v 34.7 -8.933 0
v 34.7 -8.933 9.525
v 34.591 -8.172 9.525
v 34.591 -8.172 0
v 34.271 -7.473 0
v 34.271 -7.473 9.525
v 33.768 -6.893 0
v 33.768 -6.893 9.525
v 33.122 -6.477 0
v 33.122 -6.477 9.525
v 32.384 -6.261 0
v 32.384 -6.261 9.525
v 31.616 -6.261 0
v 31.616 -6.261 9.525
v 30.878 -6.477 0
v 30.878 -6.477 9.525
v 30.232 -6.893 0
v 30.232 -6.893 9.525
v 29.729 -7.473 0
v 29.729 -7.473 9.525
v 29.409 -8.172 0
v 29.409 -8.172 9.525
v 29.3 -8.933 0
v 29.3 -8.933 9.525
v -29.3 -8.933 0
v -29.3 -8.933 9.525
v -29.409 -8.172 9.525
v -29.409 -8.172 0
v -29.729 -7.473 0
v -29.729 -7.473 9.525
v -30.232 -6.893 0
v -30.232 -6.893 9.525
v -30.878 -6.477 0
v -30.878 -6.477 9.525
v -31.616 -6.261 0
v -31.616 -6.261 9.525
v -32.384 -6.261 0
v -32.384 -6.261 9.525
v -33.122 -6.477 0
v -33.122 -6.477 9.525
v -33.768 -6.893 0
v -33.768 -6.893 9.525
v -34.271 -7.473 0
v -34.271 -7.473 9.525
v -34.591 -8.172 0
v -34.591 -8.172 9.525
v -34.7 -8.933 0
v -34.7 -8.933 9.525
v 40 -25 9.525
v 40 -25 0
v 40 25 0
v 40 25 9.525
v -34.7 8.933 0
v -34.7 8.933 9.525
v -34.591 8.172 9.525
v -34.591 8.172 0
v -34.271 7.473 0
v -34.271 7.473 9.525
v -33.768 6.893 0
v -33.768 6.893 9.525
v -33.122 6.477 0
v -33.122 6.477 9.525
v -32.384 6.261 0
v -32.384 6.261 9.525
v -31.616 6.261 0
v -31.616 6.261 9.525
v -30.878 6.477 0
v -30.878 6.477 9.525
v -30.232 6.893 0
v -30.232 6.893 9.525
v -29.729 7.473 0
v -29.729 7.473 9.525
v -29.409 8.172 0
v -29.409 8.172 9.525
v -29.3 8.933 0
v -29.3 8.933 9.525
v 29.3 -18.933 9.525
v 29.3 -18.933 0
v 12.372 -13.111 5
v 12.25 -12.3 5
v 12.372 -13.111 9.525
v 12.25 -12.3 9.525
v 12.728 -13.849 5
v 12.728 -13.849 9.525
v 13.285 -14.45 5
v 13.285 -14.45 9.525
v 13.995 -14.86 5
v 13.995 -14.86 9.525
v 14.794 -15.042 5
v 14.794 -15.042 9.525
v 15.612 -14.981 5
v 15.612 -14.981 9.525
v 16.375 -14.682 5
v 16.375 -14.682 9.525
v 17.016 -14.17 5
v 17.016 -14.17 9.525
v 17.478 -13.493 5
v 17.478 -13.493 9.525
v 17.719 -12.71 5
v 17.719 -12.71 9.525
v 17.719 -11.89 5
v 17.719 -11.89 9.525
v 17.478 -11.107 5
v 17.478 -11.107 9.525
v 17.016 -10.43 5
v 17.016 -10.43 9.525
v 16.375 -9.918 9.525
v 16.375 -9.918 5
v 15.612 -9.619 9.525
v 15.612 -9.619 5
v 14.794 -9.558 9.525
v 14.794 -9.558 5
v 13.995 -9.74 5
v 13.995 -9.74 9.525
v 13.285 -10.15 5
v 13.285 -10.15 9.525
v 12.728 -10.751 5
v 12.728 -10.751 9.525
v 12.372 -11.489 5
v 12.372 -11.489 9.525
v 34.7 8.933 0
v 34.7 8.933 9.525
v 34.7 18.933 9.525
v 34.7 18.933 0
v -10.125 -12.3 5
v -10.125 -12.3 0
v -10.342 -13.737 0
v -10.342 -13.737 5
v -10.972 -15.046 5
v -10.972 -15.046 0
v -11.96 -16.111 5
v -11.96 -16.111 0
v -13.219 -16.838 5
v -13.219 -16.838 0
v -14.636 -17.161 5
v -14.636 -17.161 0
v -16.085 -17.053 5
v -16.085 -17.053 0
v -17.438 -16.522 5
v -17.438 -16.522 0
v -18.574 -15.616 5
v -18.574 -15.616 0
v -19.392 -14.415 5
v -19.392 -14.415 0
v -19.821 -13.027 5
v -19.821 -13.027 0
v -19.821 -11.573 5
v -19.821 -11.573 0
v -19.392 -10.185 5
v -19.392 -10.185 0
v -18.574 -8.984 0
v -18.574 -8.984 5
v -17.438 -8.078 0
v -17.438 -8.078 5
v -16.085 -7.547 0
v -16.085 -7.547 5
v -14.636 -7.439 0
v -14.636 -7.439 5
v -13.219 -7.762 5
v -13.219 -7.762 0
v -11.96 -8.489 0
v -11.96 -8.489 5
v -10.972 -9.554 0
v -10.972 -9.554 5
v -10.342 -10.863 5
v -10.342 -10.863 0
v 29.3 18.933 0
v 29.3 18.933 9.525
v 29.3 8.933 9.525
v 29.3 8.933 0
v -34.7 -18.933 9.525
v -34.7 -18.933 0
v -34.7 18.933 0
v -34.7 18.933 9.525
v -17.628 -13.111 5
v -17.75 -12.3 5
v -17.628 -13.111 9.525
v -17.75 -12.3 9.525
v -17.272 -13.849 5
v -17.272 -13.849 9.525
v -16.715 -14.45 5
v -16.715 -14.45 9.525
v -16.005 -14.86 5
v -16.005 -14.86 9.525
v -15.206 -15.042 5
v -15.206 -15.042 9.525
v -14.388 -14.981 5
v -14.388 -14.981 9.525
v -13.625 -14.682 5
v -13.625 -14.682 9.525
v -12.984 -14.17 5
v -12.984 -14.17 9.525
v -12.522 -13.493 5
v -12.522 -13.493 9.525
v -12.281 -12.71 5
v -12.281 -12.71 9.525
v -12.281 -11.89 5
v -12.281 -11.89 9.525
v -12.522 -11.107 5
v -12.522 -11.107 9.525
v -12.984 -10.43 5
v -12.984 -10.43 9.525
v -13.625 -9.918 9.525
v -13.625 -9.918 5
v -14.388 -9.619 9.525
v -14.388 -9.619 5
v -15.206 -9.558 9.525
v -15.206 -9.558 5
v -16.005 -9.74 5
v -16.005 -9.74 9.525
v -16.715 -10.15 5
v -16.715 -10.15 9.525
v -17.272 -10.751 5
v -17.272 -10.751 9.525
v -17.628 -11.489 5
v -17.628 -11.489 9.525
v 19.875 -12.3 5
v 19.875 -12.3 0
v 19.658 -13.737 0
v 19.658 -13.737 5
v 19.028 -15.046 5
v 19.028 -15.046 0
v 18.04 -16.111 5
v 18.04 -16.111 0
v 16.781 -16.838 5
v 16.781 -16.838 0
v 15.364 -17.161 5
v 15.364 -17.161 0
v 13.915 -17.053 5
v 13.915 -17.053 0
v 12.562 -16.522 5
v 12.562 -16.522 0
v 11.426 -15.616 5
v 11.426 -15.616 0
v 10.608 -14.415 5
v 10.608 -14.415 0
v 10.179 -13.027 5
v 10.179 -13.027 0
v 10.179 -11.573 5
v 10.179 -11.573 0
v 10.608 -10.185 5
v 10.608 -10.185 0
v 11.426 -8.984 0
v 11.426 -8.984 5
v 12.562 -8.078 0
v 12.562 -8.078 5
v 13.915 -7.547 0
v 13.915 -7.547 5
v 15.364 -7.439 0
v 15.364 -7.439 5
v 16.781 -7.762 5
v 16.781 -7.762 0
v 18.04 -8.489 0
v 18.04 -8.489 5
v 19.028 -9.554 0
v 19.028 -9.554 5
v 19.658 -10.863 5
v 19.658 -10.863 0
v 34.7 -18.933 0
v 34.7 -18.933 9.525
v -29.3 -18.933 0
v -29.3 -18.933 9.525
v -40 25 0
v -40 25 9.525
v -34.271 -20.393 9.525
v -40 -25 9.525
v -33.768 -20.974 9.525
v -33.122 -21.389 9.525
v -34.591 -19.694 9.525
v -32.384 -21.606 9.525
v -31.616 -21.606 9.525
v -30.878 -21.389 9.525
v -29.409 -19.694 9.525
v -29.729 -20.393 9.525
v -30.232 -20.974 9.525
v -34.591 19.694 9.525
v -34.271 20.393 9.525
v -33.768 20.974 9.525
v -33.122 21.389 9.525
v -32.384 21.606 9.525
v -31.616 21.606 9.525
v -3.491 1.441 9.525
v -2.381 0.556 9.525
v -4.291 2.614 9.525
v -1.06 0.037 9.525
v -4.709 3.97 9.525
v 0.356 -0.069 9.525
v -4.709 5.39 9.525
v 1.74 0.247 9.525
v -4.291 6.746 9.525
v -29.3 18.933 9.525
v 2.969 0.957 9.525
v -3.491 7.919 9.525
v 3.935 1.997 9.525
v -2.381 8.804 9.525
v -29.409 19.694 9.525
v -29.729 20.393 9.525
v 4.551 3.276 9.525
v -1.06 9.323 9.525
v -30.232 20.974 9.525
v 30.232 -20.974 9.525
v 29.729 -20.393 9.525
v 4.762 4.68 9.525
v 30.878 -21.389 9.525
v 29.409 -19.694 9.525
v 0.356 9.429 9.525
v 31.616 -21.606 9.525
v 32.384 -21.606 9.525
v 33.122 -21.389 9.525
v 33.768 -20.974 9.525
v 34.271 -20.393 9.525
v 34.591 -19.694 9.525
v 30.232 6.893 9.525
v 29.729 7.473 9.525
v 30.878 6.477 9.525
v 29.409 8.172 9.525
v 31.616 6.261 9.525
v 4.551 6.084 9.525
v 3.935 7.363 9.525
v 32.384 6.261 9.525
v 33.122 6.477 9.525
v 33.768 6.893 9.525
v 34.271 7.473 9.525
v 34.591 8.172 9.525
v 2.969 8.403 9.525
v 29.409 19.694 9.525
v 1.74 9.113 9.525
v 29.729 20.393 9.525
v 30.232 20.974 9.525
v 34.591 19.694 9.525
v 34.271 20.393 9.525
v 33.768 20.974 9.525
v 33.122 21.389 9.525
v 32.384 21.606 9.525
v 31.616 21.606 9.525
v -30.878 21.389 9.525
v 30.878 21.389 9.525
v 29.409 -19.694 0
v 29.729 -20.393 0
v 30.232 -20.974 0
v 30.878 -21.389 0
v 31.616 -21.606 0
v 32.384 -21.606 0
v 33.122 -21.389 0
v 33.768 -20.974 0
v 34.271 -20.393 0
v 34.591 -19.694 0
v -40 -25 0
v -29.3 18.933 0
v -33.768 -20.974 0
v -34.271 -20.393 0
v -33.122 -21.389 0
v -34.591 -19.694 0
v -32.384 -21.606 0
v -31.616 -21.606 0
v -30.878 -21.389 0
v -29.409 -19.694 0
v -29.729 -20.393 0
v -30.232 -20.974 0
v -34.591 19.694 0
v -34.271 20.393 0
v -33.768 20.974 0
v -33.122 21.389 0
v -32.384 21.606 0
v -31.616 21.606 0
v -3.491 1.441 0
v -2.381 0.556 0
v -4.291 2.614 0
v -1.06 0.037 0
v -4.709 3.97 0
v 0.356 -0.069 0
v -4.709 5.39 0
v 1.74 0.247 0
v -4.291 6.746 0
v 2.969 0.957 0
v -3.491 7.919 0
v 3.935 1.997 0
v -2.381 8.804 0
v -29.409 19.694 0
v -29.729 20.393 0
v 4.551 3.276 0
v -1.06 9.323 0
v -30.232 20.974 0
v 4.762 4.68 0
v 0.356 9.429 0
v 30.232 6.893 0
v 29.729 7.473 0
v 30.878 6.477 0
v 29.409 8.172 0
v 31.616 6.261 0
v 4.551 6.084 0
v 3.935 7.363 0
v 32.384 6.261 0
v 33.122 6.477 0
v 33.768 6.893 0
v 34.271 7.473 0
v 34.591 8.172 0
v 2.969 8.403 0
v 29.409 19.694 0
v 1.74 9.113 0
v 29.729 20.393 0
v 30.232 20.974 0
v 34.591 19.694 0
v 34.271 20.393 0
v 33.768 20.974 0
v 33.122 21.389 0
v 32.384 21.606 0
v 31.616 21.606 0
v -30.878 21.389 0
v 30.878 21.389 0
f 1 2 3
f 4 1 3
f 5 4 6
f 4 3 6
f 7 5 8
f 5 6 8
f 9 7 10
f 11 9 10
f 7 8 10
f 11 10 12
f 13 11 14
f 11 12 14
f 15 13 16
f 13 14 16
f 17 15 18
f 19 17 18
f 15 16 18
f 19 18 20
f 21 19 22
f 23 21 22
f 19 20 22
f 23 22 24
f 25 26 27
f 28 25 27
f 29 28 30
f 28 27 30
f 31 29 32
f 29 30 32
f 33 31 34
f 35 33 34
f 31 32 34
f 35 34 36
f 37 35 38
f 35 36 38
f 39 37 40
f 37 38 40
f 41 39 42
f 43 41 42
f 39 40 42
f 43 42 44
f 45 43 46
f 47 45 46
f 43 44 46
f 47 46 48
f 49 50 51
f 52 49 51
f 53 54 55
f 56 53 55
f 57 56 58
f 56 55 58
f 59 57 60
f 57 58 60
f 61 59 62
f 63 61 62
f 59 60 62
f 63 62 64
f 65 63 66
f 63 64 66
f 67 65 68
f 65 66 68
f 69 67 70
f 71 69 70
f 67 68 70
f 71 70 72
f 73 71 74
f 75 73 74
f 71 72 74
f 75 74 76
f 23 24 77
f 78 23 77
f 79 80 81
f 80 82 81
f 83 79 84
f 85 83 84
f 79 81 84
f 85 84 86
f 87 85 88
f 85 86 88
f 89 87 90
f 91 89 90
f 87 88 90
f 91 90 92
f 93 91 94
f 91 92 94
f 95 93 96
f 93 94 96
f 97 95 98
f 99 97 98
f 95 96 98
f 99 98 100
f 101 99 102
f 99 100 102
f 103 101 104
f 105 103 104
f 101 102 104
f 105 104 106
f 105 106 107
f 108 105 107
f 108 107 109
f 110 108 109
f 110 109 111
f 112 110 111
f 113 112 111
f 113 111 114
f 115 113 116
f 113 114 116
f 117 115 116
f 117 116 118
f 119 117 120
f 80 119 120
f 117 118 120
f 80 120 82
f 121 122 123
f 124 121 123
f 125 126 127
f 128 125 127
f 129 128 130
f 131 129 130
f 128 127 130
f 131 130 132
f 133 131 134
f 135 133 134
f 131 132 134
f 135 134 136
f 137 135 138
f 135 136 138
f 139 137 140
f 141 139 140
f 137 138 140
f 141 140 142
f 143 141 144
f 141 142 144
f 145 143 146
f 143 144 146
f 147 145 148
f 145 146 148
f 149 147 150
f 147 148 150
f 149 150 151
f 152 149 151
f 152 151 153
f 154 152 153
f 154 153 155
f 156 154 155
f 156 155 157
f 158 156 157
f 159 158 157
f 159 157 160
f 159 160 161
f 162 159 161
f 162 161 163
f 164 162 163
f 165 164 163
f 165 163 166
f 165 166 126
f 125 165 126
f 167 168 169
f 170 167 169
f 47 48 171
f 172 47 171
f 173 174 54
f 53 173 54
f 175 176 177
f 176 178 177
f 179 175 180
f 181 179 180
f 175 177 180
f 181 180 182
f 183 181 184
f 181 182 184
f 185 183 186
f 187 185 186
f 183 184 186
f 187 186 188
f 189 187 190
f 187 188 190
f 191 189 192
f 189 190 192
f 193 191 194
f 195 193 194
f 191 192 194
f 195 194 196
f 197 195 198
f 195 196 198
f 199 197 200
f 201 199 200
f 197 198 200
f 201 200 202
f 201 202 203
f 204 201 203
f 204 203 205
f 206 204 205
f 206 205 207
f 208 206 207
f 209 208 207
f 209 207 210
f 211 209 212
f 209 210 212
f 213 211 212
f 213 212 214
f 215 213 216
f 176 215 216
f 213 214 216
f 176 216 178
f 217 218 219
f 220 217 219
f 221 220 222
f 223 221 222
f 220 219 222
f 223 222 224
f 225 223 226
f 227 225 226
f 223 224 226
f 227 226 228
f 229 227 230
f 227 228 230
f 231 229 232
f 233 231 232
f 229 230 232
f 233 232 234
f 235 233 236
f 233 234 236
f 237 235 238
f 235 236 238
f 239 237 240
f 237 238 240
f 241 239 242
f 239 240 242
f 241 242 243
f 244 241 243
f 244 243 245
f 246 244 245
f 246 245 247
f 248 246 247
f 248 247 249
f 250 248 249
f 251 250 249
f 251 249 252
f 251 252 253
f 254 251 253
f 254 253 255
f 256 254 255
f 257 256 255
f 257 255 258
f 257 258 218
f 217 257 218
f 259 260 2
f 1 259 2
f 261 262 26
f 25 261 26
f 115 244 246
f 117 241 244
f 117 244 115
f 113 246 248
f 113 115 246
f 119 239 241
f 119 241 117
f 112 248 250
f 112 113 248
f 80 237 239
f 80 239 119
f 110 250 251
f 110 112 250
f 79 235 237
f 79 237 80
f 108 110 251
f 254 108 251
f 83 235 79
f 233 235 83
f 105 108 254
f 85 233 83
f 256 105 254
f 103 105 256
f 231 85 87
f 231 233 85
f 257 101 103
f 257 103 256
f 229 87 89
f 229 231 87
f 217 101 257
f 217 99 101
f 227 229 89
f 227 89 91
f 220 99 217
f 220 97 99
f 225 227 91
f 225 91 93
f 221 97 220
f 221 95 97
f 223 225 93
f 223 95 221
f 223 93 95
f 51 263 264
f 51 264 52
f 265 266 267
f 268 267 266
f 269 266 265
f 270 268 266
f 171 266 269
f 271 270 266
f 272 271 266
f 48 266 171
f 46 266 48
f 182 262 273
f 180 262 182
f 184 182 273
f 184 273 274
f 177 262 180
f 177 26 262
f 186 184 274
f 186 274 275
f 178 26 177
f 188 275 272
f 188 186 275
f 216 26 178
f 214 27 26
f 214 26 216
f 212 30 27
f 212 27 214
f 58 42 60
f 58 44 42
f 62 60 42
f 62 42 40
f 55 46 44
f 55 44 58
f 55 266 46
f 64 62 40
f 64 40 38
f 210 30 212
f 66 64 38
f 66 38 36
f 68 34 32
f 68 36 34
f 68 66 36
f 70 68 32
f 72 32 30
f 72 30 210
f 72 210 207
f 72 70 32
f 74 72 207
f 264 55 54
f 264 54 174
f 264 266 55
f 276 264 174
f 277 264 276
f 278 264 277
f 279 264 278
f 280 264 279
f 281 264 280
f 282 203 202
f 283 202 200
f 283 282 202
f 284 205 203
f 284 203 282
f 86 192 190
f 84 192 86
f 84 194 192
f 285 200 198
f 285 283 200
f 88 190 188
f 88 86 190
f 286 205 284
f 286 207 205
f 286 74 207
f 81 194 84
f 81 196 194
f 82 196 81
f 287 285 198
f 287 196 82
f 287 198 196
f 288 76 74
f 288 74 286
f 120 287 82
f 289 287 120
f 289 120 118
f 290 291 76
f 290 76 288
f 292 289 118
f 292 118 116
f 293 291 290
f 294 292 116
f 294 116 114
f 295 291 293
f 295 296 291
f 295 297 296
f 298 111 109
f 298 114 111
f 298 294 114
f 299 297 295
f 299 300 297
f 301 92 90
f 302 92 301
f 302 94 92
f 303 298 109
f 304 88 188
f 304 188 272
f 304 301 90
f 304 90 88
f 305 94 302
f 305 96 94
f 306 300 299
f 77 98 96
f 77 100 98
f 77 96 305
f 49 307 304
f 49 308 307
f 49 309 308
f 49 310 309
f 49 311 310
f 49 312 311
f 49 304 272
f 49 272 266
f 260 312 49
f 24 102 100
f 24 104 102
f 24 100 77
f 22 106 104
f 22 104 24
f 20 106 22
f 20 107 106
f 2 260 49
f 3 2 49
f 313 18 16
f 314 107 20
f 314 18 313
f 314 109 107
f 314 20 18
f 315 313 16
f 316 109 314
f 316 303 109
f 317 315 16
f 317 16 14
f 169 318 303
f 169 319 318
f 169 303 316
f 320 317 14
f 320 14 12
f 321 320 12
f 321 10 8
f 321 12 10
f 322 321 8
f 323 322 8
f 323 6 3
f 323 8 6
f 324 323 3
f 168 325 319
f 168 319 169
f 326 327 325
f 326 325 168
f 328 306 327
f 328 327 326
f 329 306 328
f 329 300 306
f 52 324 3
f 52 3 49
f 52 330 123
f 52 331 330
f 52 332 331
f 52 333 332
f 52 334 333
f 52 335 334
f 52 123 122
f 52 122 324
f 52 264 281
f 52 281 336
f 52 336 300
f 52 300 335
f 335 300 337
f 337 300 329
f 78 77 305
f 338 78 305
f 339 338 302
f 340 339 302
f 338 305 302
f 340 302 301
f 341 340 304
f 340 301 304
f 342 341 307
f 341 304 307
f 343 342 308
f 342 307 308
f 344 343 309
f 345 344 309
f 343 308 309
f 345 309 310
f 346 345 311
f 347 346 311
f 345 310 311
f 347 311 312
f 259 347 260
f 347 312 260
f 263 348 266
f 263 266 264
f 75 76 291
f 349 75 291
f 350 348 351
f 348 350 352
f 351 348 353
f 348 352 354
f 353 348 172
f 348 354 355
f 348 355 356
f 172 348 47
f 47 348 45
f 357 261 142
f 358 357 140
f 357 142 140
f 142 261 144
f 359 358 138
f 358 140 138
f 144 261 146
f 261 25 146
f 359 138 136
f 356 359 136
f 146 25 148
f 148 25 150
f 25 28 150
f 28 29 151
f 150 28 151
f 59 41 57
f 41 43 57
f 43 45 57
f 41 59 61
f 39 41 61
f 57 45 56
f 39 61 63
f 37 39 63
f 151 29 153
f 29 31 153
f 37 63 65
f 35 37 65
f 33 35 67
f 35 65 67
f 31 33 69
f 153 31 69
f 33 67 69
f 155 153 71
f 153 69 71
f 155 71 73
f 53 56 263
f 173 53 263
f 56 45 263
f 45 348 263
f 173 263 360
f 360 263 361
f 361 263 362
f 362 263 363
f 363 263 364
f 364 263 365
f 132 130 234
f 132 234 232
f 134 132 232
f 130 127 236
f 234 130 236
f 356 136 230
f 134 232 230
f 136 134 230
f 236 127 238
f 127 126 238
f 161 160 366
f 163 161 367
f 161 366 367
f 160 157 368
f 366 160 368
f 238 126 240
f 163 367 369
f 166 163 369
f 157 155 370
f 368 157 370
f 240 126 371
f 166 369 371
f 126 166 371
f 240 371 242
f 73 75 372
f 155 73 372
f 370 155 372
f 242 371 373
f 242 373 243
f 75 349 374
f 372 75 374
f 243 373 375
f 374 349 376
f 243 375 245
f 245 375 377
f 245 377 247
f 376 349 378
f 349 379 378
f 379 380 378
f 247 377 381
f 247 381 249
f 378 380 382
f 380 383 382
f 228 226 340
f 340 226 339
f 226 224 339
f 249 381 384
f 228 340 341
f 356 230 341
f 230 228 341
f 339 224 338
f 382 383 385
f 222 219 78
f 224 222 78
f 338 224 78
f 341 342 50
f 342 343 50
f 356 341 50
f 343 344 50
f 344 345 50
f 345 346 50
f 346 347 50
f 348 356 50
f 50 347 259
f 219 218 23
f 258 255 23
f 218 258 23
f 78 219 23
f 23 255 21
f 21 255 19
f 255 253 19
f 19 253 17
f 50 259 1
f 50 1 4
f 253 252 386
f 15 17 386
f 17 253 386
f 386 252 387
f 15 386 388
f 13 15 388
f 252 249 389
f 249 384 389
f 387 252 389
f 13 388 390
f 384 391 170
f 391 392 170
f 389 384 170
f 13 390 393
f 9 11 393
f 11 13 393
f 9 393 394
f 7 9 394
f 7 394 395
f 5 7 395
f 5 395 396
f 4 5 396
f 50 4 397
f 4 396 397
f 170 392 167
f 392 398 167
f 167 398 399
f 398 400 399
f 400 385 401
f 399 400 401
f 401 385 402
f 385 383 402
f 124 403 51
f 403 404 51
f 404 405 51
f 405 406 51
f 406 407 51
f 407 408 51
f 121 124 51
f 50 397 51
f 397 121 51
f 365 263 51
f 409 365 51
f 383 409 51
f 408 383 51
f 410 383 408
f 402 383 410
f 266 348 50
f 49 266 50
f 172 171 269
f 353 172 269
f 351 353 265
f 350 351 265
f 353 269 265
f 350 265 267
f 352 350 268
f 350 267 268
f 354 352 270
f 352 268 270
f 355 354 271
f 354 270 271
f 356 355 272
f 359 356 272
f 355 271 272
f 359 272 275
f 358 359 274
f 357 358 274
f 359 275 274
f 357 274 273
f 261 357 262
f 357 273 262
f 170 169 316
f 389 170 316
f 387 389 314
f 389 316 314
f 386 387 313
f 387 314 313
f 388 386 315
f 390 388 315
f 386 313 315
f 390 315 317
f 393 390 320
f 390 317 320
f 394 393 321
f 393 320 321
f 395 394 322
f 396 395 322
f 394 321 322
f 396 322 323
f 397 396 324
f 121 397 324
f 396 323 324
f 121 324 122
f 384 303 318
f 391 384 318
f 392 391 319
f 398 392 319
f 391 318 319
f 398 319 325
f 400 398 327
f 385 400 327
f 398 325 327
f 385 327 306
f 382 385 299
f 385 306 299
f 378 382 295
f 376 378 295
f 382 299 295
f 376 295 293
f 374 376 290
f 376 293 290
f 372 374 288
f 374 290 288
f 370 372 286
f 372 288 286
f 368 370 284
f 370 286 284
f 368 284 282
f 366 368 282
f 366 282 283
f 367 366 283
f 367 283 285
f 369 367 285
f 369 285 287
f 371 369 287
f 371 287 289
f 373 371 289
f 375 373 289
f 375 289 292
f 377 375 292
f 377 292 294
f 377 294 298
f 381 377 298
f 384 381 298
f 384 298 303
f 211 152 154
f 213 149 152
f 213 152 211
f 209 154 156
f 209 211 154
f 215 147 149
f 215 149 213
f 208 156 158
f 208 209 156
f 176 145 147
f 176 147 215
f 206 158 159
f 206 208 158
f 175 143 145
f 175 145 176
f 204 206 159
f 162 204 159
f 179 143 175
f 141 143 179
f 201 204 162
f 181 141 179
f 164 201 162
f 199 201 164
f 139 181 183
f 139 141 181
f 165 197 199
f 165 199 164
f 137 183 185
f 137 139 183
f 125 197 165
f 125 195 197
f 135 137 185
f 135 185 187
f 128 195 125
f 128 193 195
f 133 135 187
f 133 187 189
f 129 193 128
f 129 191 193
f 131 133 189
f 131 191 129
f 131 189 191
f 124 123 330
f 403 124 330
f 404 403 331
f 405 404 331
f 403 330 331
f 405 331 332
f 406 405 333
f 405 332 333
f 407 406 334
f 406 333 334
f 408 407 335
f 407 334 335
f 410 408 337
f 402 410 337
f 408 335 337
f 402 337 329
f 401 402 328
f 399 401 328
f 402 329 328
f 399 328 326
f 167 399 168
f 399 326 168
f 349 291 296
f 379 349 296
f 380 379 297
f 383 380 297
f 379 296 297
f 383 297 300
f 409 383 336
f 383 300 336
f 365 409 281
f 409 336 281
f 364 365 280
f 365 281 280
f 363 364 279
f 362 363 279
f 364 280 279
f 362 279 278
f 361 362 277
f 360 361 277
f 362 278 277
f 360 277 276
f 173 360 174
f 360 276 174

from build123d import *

# Parameters (mm, degrees)
F0_W           = 80
F0_H           = 50
F1_DEPTH       = 9.525
F4_DEPTH       = 25
F5_R           = 4.7625
F6_DEPTH       = 9.526
F7_D           = 5.5
F7_CBORE_D     = 9.75
F7_CBORE_DEPTH = 5


with BuildPart() as f1:
    # F0 (on Top) → F1 (new body)
    with BuildSketch(Plane.XY):
        Rectangle(F0_W, F0_H)
    extrude(amount=F1_DEPTH)

    # F3 (on face) → F4 (cut)
    with BuildSketch(Plane.XY.offset(9.525)):
        with BuildLine():
            ThreePointArc((-29.3, 18.9330952615), (-32, 21.6330952615), (-34.7, 18.9330952615))
            Line((-34.7, 18.9330952615), (-34.7, 8.9330952615))
            ThreePointArc((-34.7, 8.9330952615), (-32, 6.2330952615), (-29.3, 8.9330952615))
            Line((-29.3, 8.9330952615), (-29.3, 18.9330952615))
        make_face()
        with BuildLine():
            ThreePointArc((-34.7, -18.9330952615), (-32, -21.6330952615), (-29.3, -18.9330952615))
            Line((-29.3, -18.9330952615), (-29.3, -8.9330952615))
            ThreePointArc((-29.3, -8.9330952615), (-32, -6.2330952615), (-34.7, -8.9330952615))
            Line((-34.7, -8.9330952615), (-34.7, -18.9330952615))
        make_face()
        with BuildLine():
            ThreePointArc((29.3, -18.9330952615), (32, -21.6330952615), (34.7, -18.9330952615))
            Line((34.7, -18.9330952615), (34.7, -8.9330952615))
            ThreePointArc((34.7, -8.9330952615), (32, -6.2330952615), (29.3, -8.9330952615))
            Line((29.3, -8.9330952615), (29.3, -18.9330952615))
        make_face()
        with BuildLine():
            ThreePointArc((34.7, 18.9330952615), (32, 21.6330952615), (29.3, 18.9330952615))
            Line((29.3, 18.9330952615), (29.3, 8.9330952615))
            ThreePointArc((29.3, 8.9330952615), (32, 6.2330952615), (34.7, 8.9330952615))
            Line((34.7, 8.9330952615), (34.7, 18.9330952615))
        make_face()
    extrude(amount=-F4_DEPTH, mode=Mode.SUBTRACT)

    # F5 (on face) → F6 (cut, through all)
    with BuildSketch(Plane.XY.offset(9.525)):
        with Locations((0, 4.68)):
            Circle(F5_R)
    extrude(amount=-F6_DEPTH, mode=Mode.SUBTRACT)

    # F7 (through all)
    with Locations(Plane(origin=(0, 0, 0), x_dir=(1, 0, 0), z_dir=(0, 0, -1))):
        with Locations((-15, 12.3), (15, 12.3)):
            CounterBoreHole(F7_D / 2, F7_CBORE_D / 2, F7_CBORE_DEPTH)


solid = f1.part
